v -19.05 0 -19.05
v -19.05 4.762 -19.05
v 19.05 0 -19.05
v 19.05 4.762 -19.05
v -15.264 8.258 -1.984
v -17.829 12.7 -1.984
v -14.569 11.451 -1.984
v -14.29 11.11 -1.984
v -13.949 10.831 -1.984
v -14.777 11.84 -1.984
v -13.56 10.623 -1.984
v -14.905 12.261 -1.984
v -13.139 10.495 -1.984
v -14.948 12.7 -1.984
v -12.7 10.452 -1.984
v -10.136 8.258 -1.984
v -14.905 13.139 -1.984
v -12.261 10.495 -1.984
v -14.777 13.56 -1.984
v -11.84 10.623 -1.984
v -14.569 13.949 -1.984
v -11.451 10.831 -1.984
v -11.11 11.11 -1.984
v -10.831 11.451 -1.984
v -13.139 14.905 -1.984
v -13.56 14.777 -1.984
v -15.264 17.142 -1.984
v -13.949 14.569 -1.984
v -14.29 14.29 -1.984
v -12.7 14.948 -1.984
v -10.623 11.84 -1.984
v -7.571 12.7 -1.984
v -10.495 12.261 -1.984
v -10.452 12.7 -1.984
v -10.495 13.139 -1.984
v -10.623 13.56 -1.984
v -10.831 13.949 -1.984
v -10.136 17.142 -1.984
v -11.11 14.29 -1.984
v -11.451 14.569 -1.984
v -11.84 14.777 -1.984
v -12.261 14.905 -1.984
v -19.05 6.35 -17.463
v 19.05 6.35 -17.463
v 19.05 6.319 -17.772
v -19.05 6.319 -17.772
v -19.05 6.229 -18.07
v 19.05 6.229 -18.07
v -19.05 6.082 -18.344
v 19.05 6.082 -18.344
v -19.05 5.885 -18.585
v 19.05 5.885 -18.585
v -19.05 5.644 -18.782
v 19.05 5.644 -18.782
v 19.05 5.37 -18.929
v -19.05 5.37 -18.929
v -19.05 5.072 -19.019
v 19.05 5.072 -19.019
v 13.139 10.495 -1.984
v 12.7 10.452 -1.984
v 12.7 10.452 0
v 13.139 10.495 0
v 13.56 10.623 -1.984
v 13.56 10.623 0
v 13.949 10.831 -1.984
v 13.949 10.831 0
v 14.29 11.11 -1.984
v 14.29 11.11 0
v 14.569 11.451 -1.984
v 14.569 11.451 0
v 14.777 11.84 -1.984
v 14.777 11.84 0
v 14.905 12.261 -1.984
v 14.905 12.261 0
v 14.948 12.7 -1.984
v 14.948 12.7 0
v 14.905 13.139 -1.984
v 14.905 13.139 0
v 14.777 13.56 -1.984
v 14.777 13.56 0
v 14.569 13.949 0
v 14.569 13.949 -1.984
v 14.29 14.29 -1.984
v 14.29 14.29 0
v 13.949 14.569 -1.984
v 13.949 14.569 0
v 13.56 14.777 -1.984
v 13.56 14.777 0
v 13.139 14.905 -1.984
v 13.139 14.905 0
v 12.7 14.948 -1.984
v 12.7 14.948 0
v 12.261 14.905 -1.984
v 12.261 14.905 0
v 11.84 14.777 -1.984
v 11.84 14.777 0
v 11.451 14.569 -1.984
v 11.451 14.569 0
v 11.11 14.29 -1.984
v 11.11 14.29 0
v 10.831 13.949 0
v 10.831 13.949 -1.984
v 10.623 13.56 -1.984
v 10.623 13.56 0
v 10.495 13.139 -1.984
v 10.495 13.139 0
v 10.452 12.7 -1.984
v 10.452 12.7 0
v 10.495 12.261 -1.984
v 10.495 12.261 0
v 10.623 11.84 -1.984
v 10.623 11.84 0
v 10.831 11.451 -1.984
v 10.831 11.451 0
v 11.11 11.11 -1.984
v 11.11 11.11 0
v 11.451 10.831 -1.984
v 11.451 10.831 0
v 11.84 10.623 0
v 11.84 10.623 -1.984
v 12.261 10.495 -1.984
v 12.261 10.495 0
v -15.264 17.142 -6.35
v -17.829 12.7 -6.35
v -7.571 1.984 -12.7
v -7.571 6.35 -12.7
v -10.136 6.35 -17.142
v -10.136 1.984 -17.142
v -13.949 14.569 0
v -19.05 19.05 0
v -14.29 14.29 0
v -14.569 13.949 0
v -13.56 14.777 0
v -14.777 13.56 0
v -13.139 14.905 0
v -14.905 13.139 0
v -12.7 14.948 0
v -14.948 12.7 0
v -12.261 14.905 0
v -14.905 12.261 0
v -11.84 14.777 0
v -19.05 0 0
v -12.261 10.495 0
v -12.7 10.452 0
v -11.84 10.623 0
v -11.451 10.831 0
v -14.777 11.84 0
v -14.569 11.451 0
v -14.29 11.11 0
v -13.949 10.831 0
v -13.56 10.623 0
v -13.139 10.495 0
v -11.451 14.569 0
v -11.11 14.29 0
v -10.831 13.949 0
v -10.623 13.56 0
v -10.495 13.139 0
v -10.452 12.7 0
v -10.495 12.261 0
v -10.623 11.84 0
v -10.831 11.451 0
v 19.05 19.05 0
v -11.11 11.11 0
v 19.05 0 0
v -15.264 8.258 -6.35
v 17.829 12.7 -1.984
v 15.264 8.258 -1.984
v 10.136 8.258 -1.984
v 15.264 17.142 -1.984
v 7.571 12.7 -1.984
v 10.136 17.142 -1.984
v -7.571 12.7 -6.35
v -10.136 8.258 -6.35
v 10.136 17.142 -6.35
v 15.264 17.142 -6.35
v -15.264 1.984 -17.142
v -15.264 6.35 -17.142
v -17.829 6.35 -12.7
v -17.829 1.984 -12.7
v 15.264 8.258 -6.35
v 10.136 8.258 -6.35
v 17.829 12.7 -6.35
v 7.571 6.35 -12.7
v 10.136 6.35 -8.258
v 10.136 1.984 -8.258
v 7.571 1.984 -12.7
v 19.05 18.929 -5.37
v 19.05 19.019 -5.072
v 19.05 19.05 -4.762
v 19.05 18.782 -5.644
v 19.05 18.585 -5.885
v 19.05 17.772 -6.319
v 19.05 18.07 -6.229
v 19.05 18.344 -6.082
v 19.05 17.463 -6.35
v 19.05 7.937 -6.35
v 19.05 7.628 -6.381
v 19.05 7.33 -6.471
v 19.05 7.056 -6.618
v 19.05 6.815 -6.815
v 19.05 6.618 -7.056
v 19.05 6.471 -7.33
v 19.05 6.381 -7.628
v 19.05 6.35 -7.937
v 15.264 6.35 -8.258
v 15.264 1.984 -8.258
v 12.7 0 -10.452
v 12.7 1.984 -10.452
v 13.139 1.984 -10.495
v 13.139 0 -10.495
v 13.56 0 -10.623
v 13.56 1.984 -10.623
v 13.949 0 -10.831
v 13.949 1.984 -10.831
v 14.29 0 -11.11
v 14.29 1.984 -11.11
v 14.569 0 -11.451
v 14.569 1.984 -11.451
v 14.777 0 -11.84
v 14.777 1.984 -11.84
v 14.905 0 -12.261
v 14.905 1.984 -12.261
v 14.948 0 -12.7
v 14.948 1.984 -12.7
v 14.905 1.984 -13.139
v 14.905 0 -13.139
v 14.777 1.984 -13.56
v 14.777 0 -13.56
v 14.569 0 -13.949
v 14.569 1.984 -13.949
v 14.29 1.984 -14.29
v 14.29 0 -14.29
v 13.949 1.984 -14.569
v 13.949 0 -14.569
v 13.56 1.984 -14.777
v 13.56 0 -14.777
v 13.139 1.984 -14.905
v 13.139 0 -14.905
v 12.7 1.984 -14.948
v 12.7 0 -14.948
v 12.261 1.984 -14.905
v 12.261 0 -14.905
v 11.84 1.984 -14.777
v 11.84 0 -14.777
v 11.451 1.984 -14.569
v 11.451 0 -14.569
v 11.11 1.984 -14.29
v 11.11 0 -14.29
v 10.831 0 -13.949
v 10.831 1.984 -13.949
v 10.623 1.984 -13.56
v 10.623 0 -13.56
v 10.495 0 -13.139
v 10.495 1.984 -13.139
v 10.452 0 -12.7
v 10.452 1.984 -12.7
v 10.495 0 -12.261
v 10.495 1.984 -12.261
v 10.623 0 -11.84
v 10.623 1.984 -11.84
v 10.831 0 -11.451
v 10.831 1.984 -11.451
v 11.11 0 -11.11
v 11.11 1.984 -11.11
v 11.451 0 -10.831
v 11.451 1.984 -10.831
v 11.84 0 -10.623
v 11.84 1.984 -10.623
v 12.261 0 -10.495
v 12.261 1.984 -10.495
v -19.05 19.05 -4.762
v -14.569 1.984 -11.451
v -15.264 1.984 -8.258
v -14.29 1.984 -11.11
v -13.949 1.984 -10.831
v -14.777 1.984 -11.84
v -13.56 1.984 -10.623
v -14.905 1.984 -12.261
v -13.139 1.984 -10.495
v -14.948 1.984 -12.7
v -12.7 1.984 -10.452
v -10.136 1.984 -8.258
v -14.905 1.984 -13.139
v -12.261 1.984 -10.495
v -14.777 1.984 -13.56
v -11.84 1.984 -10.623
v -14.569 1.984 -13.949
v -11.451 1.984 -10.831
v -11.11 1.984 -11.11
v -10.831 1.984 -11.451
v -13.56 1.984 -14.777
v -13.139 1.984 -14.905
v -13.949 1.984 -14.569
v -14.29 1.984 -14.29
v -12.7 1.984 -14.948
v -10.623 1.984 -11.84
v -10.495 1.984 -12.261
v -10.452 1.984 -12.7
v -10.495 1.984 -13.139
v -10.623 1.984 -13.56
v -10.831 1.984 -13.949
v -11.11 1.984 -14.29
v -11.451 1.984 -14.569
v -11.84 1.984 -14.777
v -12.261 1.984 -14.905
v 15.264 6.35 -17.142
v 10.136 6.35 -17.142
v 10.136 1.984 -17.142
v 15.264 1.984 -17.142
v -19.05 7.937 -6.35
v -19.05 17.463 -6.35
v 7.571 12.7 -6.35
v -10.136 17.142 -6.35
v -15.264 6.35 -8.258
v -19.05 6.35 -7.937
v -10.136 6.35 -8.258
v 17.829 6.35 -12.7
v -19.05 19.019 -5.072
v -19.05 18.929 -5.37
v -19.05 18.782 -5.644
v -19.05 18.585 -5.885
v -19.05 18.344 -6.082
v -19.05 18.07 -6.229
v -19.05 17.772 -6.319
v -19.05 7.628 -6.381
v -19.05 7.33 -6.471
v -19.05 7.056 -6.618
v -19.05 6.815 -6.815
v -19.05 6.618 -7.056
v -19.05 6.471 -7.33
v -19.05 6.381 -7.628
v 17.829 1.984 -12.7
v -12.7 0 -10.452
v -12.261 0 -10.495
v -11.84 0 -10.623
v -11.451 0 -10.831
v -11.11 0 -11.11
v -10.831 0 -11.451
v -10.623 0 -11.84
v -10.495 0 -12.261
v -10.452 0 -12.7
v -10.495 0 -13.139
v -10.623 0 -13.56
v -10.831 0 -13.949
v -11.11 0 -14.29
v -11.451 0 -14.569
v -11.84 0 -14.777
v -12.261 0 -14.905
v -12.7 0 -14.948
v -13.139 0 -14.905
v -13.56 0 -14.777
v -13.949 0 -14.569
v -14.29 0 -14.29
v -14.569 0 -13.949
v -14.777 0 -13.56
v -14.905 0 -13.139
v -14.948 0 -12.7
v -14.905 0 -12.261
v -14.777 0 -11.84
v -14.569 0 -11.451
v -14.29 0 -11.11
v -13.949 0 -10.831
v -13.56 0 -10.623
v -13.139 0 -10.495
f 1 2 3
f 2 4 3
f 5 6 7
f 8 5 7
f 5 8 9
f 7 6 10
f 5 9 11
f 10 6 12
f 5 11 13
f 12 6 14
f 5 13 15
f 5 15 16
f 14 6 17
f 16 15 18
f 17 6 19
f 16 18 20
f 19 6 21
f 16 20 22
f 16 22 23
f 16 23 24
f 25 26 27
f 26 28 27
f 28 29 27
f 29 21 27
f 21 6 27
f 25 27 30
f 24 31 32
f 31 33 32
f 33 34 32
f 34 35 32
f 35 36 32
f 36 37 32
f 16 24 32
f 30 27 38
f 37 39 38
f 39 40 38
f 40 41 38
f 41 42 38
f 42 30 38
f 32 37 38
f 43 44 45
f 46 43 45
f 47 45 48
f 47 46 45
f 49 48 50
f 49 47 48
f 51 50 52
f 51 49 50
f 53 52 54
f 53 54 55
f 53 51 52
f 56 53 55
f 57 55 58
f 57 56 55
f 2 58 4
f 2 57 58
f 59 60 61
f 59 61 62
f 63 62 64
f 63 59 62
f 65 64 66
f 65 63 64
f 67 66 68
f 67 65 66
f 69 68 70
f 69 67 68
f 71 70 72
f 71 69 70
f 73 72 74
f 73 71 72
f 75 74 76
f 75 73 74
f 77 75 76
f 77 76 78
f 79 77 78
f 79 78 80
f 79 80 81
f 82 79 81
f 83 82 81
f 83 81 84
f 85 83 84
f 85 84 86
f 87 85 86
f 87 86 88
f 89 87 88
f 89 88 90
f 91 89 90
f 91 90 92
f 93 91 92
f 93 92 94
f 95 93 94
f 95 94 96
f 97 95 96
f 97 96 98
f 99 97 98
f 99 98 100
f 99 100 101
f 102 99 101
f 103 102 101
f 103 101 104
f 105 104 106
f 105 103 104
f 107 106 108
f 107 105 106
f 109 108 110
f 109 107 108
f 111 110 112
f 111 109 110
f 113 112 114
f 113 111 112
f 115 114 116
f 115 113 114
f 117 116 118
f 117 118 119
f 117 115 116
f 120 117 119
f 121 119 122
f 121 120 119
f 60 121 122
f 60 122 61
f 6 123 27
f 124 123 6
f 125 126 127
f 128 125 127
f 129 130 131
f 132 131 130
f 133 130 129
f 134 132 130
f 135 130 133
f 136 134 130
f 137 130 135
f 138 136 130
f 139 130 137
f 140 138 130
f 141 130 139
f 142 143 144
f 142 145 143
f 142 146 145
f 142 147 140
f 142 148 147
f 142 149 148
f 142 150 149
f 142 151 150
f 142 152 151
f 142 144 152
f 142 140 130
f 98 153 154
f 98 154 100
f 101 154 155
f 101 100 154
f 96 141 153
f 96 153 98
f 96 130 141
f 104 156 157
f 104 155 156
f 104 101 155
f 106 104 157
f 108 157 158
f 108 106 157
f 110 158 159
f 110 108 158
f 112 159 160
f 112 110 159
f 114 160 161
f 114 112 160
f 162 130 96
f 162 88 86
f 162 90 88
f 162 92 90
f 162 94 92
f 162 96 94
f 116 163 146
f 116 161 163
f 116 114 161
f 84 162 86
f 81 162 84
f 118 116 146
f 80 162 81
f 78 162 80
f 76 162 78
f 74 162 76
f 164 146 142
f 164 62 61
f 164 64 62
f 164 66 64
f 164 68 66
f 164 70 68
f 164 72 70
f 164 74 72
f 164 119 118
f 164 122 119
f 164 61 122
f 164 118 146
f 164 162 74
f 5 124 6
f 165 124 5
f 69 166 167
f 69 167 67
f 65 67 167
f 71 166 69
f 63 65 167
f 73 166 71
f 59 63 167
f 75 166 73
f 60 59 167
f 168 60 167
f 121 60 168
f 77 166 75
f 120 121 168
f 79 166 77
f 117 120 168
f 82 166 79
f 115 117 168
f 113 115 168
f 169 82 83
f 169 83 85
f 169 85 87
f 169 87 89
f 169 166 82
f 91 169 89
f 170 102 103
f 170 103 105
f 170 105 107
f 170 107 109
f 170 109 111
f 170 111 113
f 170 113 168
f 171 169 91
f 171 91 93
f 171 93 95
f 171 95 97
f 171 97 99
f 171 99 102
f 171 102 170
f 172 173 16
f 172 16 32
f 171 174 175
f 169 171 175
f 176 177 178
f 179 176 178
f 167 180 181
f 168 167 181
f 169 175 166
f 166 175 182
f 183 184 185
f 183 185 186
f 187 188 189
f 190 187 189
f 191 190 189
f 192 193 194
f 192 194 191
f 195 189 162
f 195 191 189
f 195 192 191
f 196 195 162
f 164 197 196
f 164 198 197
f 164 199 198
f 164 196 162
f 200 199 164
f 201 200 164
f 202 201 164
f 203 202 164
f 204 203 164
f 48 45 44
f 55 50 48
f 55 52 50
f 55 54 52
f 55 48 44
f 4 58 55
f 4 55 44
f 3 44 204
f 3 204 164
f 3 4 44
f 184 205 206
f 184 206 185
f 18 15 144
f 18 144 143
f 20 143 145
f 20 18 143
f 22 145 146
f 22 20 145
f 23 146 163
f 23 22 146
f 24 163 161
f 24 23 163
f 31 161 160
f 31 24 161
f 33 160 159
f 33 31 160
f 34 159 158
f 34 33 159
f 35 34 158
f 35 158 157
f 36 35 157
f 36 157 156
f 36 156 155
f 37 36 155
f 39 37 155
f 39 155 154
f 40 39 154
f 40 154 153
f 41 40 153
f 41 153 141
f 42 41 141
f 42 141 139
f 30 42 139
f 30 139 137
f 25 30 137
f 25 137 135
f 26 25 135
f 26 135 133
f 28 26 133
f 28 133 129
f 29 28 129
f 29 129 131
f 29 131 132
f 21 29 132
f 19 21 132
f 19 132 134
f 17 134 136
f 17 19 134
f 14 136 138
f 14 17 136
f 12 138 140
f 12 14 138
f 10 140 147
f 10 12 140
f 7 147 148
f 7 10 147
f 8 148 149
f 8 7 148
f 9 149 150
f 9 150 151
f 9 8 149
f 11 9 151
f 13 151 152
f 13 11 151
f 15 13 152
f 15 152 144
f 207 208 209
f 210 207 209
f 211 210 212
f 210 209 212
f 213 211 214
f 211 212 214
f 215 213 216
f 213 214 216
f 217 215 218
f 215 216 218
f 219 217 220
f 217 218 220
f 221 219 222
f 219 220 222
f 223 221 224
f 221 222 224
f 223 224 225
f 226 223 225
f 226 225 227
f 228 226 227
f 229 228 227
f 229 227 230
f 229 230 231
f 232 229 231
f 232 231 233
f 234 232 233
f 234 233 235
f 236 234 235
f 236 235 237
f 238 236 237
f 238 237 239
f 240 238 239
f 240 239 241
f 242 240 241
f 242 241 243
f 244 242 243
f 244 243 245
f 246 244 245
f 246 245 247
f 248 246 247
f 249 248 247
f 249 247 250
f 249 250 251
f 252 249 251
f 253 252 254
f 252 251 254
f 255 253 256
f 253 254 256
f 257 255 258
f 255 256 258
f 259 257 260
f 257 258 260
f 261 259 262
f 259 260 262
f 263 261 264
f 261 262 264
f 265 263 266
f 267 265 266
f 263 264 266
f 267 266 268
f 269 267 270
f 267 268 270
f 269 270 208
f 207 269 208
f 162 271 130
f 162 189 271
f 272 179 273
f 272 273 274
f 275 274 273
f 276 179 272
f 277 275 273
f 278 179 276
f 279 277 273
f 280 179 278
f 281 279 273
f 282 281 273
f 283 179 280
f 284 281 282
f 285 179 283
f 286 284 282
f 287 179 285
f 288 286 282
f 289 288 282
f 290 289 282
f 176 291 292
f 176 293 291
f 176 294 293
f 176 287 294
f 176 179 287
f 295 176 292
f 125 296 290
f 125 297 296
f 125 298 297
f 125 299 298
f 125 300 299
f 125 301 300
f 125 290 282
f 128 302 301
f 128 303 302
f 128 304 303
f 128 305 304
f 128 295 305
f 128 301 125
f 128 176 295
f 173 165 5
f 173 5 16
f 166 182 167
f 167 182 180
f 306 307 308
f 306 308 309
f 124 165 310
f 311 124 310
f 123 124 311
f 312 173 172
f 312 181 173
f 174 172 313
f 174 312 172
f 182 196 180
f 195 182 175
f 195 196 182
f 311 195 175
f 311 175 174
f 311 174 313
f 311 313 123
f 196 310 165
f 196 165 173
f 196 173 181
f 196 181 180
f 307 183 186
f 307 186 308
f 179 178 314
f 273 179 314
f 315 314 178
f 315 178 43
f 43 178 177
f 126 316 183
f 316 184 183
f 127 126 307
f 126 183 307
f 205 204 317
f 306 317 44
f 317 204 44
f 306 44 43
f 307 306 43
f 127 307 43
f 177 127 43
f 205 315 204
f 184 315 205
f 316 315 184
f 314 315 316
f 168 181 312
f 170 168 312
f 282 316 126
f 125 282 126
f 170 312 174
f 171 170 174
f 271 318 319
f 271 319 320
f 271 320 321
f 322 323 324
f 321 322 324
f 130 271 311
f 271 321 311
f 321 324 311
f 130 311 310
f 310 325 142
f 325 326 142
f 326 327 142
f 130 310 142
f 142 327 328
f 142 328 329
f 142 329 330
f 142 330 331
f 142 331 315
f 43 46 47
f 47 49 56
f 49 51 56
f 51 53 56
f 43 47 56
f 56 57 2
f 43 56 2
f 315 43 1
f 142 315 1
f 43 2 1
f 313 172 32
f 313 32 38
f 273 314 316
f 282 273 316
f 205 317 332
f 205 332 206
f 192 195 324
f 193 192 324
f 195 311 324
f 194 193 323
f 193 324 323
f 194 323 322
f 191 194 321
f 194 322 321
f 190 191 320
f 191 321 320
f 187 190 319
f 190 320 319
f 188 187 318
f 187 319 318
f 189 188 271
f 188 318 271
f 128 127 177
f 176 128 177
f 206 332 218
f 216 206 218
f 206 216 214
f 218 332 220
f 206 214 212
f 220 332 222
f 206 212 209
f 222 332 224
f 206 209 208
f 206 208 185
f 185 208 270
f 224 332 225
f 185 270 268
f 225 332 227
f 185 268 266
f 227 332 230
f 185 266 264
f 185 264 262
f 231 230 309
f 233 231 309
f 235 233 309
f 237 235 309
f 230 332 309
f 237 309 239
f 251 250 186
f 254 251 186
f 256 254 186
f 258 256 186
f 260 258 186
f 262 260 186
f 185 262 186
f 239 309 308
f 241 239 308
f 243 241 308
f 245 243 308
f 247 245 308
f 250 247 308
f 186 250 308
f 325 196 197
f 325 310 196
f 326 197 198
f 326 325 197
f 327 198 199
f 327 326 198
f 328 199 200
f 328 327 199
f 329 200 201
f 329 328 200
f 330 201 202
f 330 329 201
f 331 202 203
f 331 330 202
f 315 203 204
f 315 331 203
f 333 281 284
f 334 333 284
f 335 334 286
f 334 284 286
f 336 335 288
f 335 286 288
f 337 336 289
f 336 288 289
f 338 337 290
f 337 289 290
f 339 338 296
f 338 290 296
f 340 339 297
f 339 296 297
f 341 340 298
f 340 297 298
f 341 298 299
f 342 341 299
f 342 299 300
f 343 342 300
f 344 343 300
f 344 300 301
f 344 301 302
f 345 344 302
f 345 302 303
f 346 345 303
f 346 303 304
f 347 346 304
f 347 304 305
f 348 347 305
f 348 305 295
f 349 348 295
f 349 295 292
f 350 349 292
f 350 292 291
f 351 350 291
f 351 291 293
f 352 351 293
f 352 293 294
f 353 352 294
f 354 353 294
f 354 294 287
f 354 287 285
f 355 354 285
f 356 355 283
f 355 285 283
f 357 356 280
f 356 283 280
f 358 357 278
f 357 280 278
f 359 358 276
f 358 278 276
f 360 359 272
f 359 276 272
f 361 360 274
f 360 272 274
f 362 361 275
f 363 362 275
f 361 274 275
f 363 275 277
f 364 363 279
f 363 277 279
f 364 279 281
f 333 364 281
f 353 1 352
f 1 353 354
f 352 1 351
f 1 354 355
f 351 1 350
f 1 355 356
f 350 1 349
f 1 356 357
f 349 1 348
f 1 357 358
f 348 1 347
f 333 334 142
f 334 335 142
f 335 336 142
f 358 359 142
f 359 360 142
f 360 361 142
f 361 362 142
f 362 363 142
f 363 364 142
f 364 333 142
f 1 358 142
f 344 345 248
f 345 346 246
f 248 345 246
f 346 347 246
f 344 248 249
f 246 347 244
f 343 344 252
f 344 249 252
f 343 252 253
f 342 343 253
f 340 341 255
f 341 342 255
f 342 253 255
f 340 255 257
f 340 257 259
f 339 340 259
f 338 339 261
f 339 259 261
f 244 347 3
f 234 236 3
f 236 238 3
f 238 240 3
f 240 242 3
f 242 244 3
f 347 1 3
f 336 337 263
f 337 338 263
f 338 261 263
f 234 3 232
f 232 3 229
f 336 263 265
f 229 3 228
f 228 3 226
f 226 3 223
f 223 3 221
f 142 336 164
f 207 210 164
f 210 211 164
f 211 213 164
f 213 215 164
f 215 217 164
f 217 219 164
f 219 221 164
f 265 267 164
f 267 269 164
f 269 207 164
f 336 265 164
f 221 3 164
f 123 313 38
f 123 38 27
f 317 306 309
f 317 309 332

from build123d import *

# Parameters (mm, degrees)
BOSS_EXTRUDE1_DEPTH = 19.05
SKETCH2_R           = 2.2479
CUT_EXTRUDE1_DEPTH  = 4.365625
SKETCH2_2_R         = 2.2479
CUT_EXTRUDE2_DEPTH  = 28.679008291
FILLET1_R           = 1.5875
FILLET2_R           = 1.5875


with BuildPart() as part:
    # Sketch1 → Boss-Extrude1 (new, symmetric)
    with BuildSketch(Plane(origin=(0, 0, 0), x_dir=(0, 0, -1), z_dir=(1, 0, 0))):
        Polygon((0, 0), (6.35, 6.35), (19.05, 6.35), (19.05, 0), align=None)
    extrude(amount=BOSS_EXTRUDE1_DEPTH, both=True)

    # Sketch2 → Cut-Extrude1 (cut)
    # profile 1 of 2: a face of its own
    with BuildSketch(Plane(origin=(0, 6.35, 0), x_dir=(1, 0, 0), z_dir=(0, 1, 0))):
        Polygon((-17.828977719, 12.7), (-15.264488859, 8.258175), (-10.135511141, 8.258175), (-7.571022281, 12.7), (-10.135511141, 17.141825), (-15.264488859, 17.141825), align=None)
        with Locations((-12.7, 12.7)):
            Circle(SKETCH2_R, mode=Mode.SUBTRACT)
    # profile 2 of 2: a face of its own
    with BuildSketch(Plane(origin=(0, 6.35, 0), x_dir=(1, 0, 0), z_dir=(0, 1, 0))):
        Polygon((15.264488859, 17.141825), (17.828977719, 12.7), (15.264488859, 8.258175), (10.135511141, 8.258175), (7.571022281, 12.7), (10.135511141, 17.141825), align=None)
        with Locations((12.7, 12.7)):
            Circle(SKETCH2_R, mode=Mode.SUBTRACT)
    extrude(amount=-CUT_EXTRUDE1_DEPTH, mode=Mode.SUBTRACT)

    # Sketch2<2> → Cut-Extrude2 (cut, through all)
    with BuildSketch(Plane(origin=(0, 6.35, 0), x_dir=(1, 0, 0), z_dir=(0, 1, 0))):
        with Locations((-12.7, 12.7)):
            Circle(SKETCH2_2_R)
        with Locations((12.7, 12.7)):
            Circle(SKETCH2_2_R)
    extrude(amount=-CUT_EXTRUDE2_DEPTH, mode=Mode.SUBTRACT)

    # Mirror1: part across plane


with BuildPart() as part_1:
    add(part.part)
    add(part.part.mirror(Plane(origin=(19.05, 0, 0), x_dir=(0, -0.707106781186549, 0.707106781186546), z_dir=(0, -0.7071067811865462, -0.7071067811865489))))

    # Fillet1
    fillet1_edges = [part_1.edges().sort_by_distance(p)[0] for p in [
        (0, 6.35, -6.35),
    ]]
    fillet(fillet1_edges, radius=FILLET1_R)

    # Fillet2
    fillet2_edges = [part_1.edges().sort_by_distance(p)[0] for p in [
        (0, 6.35, -19.05),
        (0, 19.05, -6.35),
    ]]
    fillet(fillet2_edges, radius=FILLET2_R)


solid = part_1.part
